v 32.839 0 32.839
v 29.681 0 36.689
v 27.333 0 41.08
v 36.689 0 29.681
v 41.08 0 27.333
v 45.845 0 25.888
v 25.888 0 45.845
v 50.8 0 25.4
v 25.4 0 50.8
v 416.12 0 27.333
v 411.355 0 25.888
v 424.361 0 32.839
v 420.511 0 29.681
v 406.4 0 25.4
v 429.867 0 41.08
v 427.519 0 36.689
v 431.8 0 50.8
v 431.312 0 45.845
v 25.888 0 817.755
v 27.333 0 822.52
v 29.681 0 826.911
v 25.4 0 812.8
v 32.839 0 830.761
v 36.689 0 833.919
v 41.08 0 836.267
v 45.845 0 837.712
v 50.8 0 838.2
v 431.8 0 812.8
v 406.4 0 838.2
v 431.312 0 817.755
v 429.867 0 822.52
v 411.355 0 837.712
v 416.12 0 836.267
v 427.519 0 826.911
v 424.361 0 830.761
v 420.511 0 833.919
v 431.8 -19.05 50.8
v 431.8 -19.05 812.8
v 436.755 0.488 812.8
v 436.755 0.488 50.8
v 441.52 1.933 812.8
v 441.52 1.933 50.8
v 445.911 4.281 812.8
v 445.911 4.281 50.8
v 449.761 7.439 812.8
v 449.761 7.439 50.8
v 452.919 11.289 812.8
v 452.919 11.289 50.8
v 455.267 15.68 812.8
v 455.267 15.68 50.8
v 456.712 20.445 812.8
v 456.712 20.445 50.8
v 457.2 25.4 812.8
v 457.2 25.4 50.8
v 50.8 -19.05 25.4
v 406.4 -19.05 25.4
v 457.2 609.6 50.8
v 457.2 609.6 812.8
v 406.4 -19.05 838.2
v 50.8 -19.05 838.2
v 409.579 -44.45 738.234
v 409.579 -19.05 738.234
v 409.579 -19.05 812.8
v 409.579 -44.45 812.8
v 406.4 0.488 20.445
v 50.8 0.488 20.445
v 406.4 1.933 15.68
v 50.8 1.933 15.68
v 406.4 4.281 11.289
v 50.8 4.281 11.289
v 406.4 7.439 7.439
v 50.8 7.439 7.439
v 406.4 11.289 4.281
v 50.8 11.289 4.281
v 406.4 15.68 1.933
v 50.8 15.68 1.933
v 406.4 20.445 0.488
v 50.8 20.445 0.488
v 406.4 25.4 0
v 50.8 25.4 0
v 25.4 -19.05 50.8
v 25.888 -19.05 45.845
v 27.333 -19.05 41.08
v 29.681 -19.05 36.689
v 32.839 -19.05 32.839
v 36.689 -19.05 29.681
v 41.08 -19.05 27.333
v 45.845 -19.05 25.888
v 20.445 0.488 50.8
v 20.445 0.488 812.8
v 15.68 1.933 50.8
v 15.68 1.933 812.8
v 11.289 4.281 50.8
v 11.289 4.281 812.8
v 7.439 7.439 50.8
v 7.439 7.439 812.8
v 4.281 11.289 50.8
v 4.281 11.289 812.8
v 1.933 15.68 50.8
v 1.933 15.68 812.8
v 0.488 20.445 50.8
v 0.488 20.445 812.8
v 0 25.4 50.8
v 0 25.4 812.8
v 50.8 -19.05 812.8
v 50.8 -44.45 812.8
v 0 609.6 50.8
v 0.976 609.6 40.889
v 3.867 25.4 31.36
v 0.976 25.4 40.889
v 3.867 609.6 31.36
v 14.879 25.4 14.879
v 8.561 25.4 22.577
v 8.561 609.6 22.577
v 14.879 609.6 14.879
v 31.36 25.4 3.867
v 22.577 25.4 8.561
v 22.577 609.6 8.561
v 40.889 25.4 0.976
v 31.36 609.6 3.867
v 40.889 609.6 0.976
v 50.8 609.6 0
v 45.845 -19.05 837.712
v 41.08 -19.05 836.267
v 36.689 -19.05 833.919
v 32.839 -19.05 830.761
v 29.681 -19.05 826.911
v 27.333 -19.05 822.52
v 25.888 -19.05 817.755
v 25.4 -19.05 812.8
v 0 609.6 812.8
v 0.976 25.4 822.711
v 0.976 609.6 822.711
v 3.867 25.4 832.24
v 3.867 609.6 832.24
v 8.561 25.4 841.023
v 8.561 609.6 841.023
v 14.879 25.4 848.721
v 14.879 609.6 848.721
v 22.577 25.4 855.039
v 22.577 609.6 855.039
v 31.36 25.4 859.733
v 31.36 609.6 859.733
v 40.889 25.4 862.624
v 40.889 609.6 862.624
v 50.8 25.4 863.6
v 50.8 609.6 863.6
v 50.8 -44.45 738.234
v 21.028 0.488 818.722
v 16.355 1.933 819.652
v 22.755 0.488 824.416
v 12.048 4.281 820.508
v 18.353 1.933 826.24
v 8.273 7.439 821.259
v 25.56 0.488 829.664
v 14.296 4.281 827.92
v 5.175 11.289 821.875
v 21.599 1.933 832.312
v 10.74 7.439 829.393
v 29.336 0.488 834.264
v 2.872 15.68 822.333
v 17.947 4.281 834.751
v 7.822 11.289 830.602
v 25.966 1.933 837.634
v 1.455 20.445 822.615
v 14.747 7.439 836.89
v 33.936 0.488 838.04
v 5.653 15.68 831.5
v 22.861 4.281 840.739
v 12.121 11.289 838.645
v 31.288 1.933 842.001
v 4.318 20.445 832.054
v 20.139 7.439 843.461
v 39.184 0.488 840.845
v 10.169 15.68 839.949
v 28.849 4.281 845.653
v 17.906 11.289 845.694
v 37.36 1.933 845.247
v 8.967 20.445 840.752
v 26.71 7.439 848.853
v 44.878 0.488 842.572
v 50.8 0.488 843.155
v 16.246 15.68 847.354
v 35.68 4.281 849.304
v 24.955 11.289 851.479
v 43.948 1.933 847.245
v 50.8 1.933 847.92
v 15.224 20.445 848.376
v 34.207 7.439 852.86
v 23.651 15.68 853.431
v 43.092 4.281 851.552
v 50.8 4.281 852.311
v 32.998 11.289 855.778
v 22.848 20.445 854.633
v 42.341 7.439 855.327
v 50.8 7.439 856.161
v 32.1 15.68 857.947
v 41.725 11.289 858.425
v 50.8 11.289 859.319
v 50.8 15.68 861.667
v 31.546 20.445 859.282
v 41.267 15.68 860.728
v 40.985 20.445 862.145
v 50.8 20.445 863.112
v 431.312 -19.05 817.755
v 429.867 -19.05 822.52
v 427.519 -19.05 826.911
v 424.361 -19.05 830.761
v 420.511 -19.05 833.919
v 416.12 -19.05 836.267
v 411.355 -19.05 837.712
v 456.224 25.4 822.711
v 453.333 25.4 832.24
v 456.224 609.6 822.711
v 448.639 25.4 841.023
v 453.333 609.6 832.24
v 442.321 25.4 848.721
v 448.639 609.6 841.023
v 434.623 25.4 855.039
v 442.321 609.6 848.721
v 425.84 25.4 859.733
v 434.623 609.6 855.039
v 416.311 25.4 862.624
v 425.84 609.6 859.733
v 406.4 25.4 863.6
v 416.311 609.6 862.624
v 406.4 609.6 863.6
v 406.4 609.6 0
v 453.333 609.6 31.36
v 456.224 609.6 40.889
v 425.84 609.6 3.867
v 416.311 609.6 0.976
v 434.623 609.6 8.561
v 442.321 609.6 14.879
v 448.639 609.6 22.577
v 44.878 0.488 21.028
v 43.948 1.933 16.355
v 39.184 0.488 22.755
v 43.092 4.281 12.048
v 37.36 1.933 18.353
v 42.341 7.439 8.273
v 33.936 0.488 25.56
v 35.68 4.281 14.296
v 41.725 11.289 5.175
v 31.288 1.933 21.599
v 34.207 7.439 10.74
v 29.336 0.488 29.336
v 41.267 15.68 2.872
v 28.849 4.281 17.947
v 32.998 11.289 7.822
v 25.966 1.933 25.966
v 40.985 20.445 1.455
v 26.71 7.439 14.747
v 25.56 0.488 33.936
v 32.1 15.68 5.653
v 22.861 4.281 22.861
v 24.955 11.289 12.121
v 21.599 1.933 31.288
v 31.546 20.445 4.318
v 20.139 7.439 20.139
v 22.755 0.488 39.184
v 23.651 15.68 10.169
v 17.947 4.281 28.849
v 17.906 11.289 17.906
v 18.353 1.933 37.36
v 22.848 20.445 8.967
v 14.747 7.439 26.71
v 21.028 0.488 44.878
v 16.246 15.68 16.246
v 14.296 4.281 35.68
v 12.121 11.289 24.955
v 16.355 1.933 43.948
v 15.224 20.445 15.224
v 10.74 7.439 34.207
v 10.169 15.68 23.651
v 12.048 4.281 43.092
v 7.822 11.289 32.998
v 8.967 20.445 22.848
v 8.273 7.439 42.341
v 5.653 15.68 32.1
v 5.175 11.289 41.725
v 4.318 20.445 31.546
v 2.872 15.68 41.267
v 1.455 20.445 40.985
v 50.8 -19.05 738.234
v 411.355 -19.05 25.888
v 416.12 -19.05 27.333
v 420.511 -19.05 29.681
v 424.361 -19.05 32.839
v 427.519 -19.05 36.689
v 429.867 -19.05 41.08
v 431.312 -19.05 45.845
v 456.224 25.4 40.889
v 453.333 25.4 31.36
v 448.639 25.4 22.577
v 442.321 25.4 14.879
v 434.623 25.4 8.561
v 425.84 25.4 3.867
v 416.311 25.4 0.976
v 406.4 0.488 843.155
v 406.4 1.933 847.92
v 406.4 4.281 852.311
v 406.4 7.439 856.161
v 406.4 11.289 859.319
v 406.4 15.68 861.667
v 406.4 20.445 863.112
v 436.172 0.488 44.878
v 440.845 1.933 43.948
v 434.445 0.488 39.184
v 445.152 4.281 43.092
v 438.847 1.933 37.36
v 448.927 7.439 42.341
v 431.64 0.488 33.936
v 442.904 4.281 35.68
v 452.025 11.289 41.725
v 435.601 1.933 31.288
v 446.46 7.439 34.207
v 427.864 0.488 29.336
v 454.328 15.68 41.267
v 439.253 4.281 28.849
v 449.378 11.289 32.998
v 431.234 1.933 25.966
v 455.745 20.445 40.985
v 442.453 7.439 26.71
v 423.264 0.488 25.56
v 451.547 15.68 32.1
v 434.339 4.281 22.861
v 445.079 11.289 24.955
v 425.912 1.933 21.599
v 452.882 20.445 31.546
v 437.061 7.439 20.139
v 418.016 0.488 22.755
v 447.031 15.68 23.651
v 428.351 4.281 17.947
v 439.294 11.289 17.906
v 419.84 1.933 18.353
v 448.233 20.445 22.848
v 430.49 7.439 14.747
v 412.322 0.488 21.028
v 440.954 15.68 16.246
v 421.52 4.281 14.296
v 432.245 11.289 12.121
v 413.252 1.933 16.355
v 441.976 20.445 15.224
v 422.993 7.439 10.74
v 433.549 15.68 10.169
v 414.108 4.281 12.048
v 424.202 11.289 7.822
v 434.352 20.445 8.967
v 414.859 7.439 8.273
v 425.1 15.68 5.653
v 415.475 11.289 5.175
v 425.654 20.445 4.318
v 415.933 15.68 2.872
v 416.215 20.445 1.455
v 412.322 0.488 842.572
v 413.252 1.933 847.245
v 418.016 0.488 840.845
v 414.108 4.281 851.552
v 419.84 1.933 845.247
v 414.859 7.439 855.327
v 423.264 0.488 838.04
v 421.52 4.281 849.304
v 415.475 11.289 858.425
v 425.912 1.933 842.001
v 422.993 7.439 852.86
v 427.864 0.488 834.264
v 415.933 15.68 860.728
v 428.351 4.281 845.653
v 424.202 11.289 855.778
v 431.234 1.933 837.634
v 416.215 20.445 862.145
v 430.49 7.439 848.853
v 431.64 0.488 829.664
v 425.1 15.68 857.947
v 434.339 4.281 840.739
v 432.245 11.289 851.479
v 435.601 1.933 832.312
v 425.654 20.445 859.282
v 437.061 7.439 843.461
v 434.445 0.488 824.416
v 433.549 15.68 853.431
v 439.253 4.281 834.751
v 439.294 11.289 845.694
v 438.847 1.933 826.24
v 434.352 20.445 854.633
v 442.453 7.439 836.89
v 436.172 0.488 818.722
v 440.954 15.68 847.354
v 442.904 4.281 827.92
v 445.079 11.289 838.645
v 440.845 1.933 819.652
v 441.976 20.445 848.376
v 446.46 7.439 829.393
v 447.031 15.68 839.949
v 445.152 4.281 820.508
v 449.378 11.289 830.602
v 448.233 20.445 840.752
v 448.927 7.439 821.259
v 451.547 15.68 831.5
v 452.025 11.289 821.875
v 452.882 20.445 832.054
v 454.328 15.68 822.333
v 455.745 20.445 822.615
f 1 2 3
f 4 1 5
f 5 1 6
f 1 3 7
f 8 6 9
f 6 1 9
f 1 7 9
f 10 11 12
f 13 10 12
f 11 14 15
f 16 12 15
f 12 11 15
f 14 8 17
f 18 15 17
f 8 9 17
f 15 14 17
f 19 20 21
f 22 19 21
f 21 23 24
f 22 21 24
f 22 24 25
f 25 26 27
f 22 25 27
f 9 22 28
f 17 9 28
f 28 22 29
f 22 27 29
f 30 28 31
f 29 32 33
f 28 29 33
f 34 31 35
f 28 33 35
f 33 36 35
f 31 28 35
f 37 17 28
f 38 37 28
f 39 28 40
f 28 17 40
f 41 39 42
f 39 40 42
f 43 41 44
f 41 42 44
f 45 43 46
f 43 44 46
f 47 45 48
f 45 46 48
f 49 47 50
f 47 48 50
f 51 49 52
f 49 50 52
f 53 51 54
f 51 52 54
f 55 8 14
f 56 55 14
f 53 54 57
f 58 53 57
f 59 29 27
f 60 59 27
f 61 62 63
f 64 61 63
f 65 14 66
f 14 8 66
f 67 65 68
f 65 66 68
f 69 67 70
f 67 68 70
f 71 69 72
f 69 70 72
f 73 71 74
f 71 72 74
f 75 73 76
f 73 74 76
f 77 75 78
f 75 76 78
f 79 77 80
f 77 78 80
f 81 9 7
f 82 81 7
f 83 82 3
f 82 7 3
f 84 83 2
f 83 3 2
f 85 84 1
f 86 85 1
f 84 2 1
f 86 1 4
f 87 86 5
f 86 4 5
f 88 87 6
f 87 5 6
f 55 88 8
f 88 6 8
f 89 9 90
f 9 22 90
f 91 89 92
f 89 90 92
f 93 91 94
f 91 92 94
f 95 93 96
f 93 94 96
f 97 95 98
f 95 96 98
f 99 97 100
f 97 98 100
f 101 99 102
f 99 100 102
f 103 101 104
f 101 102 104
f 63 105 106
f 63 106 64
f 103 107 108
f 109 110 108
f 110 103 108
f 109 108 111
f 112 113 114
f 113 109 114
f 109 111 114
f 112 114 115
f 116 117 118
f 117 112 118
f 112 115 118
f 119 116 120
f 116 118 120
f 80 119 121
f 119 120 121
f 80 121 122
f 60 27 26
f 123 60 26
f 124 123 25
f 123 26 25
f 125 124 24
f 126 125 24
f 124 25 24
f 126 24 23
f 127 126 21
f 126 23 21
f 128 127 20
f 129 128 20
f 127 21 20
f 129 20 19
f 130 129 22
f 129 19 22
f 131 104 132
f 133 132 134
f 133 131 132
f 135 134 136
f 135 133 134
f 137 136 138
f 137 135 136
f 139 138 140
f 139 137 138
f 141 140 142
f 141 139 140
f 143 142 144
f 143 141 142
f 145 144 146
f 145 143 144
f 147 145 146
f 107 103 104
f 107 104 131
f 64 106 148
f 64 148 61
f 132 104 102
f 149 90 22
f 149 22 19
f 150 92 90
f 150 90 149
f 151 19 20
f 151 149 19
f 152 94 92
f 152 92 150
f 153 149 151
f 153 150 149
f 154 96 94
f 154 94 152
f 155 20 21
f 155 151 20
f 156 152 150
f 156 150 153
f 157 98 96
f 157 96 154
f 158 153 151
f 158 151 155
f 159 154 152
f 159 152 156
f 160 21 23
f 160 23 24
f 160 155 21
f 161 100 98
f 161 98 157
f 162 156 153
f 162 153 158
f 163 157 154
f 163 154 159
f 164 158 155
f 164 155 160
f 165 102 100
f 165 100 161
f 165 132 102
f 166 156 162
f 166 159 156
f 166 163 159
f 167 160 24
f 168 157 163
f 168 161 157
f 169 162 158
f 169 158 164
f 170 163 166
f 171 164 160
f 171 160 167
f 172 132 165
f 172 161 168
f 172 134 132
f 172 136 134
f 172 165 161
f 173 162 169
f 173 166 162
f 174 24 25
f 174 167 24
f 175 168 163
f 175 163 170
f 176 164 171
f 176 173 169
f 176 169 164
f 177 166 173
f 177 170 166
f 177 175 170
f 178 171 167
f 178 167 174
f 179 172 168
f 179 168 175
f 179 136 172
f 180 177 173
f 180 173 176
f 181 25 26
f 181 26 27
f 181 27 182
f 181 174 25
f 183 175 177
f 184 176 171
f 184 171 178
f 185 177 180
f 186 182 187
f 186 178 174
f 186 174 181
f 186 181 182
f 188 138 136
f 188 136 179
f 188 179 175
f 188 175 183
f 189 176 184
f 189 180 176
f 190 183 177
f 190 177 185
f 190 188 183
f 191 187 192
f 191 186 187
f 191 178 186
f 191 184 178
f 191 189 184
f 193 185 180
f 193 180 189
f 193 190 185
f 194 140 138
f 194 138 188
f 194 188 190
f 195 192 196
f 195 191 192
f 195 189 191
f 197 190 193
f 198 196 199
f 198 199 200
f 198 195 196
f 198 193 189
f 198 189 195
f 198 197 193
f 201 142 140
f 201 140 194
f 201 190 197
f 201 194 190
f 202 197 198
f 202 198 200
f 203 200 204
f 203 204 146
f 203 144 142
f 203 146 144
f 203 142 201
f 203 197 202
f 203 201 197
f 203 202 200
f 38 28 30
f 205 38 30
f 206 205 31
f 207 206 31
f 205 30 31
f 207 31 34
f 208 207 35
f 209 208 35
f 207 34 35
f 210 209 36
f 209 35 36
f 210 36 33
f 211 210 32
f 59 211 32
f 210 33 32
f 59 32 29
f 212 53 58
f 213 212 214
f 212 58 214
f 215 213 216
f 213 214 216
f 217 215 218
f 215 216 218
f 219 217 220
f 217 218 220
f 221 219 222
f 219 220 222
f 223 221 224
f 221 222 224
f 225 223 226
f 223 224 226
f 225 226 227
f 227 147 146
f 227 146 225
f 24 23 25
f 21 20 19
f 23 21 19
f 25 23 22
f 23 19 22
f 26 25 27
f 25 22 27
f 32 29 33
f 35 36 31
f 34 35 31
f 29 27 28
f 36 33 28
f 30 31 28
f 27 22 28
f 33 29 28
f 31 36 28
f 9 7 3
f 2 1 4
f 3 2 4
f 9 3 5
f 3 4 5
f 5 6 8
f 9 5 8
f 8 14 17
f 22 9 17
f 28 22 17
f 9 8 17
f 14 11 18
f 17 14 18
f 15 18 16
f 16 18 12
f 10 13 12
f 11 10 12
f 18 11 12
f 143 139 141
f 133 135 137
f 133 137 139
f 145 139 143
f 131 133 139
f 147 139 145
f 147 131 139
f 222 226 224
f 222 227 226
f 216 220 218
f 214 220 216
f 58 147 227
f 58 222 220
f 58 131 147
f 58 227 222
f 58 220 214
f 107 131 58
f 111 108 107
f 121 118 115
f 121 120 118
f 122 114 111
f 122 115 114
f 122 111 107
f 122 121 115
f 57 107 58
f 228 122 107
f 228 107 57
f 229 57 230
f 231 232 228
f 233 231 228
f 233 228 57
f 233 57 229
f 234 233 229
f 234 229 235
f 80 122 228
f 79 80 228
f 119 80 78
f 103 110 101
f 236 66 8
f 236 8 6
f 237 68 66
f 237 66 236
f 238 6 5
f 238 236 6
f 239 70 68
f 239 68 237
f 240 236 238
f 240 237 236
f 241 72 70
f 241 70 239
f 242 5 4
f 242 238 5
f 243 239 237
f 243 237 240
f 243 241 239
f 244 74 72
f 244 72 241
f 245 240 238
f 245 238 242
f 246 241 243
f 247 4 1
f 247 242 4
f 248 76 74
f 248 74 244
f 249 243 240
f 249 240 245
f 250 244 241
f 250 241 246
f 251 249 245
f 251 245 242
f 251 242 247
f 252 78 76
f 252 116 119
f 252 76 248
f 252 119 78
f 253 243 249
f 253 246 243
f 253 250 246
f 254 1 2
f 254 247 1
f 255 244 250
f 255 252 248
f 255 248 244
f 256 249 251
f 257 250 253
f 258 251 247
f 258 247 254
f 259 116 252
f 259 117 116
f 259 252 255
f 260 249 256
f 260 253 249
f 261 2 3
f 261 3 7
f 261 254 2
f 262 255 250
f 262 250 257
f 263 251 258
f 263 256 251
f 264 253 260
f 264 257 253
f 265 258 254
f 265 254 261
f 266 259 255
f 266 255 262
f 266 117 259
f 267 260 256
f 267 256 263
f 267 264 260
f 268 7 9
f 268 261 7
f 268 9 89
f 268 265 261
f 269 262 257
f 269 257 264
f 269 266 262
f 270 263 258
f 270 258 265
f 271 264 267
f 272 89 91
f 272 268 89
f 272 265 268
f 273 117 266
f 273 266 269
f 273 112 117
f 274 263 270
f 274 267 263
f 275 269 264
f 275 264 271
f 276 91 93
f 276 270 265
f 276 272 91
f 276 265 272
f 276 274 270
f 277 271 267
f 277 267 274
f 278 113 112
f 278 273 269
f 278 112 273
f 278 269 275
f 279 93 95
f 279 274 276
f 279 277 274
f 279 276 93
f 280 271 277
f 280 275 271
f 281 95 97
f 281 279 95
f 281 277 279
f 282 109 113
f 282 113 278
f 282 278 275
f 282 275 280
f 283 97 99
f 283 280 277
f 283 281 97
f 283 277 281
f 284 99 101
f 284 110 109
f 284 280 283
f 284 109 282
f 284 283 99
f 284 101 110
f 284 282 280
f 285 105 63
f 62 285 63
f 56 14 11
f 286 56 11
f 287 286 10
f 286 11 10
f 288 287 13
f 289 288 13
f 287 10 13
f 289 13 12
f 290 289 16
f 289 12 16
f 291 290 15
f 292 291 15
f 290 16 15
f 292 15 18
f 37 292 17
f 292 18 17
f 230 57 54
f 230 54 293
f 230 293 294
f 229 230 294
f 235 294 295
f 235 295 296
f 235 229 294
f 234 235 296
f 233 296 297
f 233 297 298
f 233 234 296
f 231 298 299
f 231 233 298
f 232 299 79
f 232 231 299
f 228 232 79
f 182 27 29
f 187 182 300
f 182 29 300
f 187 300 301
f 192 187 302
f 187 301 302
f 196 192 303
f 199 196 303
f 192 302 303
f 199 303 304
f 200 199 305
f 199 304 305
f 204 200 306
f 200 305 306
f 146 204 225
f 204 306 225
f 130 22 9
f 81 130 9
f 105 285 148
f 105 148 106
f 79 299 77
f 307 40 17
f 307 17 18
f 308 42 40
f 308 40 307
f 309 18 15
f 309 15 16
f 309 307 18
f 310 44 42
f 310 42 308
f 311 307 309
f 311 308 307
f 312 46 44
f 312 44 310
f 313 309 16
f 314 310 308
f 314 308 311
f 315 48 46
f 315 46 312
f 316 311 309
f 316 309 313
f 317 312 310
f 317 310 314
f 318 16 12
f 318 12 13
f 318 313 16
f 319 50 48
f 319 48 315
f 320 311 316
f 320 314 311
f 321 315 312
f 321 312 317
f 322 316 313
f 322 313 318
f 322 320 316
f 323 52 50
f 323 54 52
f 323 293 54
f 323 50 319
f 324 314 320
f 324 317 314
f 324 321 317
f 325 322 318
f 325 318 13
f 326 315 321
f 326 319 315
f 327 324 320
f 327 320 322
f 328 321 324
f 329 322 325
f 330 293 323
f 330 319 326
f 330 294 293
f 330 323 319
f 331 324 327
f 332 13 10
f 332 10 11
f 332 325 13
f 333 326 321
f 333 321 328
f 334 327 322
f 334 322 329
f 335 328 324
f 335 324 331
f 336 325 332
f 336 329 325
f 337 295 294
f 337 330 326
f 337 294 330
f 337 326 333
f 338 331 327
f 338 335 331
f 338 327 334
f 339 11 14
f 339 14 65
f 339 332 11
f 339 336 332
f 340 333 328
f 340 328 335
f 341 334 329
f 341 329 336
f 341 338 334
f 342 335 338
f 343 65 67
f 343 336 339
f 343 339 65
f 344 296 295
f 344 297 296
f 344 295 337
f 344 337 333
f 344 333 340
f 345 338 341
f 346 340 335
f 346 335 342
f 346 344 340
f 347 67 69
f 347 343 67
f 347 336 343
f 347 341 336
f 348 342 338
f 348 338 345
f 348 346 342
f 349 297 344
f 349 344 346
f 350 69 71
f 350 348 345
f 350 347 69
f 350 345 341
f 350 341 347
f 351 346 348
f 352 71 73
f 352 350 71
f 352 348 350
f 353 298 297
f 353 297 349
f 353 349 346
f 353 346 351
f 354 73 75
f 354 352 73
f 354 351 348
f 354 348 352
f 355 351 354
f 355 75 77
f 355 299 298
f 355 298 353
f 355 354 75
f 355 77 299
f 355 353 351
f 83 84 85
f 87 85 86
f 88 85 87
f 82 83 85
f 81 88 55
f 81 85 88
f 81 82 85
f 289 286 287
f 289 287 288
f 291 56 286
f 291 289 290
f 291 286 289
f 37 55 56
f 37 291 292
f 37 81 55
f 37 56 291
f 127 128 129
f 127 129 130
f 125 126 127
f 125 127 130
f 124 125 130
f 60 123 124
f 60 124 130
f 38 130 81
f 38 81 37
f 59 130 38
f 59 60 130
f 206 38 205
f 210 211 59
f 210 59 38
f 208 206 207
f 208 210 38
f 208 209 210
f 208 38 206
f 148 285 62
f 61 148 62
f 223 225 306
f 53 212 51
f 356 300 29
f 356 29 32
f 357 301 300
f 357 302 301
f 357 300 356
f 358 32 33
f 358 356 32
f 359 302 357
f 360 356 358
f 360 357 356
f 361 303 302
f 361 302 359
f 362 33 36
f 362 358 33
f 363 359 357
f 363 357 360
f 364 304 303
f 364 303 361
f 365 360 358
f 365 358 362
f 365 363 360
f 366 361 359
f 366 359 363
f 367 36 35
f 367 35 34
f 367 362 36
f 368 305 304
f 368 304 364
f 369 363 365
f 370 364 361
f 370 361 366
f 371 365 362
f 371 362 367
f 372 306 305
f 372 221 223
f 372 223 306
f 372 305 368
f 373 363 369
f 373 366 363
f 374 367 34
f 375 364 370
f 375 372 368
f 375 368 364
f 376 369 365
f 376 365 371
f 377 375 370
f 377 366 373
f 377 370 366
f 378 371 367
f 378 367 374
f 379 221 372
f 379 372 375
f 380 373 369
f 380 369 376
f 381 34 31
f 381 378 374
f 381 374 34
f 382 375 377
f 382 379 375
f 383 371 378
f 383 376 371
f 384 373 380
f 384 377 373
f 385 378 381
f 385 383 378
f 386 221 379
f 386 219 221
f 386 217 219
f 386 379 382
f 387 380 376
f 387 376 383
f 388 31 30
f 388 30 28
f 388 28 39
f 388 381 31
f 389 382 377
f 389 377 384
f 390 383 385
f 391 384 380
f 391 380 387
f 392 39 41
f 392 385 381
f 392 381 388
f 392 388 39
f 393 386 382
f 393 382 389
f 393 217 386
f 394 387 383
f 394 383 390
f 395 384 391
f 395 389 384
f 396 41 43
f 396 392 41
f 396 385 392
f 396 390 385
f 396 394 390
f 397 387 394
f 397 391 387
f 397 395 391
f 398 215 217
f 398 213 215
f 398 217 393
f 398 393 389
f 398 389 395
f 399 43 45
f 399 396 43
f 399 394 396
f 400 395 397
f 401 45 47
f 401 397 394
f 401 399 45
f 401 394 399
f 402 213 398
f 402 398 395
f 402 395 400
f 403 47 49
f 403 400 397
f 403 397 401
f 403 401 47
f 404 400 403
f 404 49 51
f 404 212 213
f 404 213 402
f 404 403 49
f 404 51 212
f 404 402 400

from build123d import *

# Parameters (mm, degrees)
F0_W     = 457.2
F0_H     = 609.6
F1_DEPTH = 863.6
F2_R     = 50.8
F3_R     = 25.4
F5_DEPTH = 19.05
F6_W     = 358.7785915852
F6_H     = 74.5661356926
F7_DEPTH = 25.4


with BuildPart() as f1:
    # F0 (on Top) → F1 (new body)
    with BuildSketch(Plane.XY):
        with Locations((228.6, 304.8)):
            Rectangle(F0_W, F0_H)
    extrude(amount=F1_DEPTH)

    # F2
    f2_edges = [f1.edges().sort_by_distance(p)[0] for p in [
        (0, 304.8, 863.6),
        (457.2, 304.8, 863.6),
        (457.2, 304.8, 0),
        (0, 304.8, 0),
    ]]
    fillet(f2_edges, radius=F2_R)

    # F3
    f3_edges = [f1.edges().sort_by_distance(p)[0] for p in [
        (228.6, 0, 863.6),
        (0, 0, 431.8),
        (14.878976, 0, 14.878976),
        (14.878976, 0, 848.721024),
        (228.6, 0, 0),
        (442.321024, 0, 14.878976),
        (442.321024, 0, 848.721024),
        (457.2, 0, 431.8),
    ]]
    fillet(f3_edges, radius=F3_R)


with BuildPart() as f5:
    # F4 (on face) → F5 (new body)
    with BuildSketch(Plane.XZ):
        with BuildLine():
            ThreePointArc((431.8, 812.8), (424.3605122421, 830.7605122421), (406.4, 838.2))
            Line((406.4, 838.2), (50.8, 838.2))
            ThreePointArc((50.8, 838.2), (32.8394877579, 830.7605122421), (25.4, 812.8))
            Line((25.4, 812.8), (25.4, 50.8))
            ThreePointArc((25.4, 50.8), (32.8394877579, 32.8394877579), (50.8, 25.4))
            Line((50.8, 25.4), (406.4, 25.4))
            ThreePointArc((406.4, 25.4), (424.3605122421, 32.8394877579), (431.8, 50.8))
            Line((431.8, 50.8), (431.8, 812.8))
        make_face()
    extrude(amount=F5_DEPTH)


with BuildPart() as f7:
    # F6 (on face) → F7 (new body)
    with BuildSketch(Plane.XZ.offset(19.05)):
        with Locations((230.1892957926, 775.5169321537)):
            Rectangle(F6_W, F6_H)
    extrude(amount=F7_DEPTH)


solid = Compound([f1.part, f5.part, f7.part])
